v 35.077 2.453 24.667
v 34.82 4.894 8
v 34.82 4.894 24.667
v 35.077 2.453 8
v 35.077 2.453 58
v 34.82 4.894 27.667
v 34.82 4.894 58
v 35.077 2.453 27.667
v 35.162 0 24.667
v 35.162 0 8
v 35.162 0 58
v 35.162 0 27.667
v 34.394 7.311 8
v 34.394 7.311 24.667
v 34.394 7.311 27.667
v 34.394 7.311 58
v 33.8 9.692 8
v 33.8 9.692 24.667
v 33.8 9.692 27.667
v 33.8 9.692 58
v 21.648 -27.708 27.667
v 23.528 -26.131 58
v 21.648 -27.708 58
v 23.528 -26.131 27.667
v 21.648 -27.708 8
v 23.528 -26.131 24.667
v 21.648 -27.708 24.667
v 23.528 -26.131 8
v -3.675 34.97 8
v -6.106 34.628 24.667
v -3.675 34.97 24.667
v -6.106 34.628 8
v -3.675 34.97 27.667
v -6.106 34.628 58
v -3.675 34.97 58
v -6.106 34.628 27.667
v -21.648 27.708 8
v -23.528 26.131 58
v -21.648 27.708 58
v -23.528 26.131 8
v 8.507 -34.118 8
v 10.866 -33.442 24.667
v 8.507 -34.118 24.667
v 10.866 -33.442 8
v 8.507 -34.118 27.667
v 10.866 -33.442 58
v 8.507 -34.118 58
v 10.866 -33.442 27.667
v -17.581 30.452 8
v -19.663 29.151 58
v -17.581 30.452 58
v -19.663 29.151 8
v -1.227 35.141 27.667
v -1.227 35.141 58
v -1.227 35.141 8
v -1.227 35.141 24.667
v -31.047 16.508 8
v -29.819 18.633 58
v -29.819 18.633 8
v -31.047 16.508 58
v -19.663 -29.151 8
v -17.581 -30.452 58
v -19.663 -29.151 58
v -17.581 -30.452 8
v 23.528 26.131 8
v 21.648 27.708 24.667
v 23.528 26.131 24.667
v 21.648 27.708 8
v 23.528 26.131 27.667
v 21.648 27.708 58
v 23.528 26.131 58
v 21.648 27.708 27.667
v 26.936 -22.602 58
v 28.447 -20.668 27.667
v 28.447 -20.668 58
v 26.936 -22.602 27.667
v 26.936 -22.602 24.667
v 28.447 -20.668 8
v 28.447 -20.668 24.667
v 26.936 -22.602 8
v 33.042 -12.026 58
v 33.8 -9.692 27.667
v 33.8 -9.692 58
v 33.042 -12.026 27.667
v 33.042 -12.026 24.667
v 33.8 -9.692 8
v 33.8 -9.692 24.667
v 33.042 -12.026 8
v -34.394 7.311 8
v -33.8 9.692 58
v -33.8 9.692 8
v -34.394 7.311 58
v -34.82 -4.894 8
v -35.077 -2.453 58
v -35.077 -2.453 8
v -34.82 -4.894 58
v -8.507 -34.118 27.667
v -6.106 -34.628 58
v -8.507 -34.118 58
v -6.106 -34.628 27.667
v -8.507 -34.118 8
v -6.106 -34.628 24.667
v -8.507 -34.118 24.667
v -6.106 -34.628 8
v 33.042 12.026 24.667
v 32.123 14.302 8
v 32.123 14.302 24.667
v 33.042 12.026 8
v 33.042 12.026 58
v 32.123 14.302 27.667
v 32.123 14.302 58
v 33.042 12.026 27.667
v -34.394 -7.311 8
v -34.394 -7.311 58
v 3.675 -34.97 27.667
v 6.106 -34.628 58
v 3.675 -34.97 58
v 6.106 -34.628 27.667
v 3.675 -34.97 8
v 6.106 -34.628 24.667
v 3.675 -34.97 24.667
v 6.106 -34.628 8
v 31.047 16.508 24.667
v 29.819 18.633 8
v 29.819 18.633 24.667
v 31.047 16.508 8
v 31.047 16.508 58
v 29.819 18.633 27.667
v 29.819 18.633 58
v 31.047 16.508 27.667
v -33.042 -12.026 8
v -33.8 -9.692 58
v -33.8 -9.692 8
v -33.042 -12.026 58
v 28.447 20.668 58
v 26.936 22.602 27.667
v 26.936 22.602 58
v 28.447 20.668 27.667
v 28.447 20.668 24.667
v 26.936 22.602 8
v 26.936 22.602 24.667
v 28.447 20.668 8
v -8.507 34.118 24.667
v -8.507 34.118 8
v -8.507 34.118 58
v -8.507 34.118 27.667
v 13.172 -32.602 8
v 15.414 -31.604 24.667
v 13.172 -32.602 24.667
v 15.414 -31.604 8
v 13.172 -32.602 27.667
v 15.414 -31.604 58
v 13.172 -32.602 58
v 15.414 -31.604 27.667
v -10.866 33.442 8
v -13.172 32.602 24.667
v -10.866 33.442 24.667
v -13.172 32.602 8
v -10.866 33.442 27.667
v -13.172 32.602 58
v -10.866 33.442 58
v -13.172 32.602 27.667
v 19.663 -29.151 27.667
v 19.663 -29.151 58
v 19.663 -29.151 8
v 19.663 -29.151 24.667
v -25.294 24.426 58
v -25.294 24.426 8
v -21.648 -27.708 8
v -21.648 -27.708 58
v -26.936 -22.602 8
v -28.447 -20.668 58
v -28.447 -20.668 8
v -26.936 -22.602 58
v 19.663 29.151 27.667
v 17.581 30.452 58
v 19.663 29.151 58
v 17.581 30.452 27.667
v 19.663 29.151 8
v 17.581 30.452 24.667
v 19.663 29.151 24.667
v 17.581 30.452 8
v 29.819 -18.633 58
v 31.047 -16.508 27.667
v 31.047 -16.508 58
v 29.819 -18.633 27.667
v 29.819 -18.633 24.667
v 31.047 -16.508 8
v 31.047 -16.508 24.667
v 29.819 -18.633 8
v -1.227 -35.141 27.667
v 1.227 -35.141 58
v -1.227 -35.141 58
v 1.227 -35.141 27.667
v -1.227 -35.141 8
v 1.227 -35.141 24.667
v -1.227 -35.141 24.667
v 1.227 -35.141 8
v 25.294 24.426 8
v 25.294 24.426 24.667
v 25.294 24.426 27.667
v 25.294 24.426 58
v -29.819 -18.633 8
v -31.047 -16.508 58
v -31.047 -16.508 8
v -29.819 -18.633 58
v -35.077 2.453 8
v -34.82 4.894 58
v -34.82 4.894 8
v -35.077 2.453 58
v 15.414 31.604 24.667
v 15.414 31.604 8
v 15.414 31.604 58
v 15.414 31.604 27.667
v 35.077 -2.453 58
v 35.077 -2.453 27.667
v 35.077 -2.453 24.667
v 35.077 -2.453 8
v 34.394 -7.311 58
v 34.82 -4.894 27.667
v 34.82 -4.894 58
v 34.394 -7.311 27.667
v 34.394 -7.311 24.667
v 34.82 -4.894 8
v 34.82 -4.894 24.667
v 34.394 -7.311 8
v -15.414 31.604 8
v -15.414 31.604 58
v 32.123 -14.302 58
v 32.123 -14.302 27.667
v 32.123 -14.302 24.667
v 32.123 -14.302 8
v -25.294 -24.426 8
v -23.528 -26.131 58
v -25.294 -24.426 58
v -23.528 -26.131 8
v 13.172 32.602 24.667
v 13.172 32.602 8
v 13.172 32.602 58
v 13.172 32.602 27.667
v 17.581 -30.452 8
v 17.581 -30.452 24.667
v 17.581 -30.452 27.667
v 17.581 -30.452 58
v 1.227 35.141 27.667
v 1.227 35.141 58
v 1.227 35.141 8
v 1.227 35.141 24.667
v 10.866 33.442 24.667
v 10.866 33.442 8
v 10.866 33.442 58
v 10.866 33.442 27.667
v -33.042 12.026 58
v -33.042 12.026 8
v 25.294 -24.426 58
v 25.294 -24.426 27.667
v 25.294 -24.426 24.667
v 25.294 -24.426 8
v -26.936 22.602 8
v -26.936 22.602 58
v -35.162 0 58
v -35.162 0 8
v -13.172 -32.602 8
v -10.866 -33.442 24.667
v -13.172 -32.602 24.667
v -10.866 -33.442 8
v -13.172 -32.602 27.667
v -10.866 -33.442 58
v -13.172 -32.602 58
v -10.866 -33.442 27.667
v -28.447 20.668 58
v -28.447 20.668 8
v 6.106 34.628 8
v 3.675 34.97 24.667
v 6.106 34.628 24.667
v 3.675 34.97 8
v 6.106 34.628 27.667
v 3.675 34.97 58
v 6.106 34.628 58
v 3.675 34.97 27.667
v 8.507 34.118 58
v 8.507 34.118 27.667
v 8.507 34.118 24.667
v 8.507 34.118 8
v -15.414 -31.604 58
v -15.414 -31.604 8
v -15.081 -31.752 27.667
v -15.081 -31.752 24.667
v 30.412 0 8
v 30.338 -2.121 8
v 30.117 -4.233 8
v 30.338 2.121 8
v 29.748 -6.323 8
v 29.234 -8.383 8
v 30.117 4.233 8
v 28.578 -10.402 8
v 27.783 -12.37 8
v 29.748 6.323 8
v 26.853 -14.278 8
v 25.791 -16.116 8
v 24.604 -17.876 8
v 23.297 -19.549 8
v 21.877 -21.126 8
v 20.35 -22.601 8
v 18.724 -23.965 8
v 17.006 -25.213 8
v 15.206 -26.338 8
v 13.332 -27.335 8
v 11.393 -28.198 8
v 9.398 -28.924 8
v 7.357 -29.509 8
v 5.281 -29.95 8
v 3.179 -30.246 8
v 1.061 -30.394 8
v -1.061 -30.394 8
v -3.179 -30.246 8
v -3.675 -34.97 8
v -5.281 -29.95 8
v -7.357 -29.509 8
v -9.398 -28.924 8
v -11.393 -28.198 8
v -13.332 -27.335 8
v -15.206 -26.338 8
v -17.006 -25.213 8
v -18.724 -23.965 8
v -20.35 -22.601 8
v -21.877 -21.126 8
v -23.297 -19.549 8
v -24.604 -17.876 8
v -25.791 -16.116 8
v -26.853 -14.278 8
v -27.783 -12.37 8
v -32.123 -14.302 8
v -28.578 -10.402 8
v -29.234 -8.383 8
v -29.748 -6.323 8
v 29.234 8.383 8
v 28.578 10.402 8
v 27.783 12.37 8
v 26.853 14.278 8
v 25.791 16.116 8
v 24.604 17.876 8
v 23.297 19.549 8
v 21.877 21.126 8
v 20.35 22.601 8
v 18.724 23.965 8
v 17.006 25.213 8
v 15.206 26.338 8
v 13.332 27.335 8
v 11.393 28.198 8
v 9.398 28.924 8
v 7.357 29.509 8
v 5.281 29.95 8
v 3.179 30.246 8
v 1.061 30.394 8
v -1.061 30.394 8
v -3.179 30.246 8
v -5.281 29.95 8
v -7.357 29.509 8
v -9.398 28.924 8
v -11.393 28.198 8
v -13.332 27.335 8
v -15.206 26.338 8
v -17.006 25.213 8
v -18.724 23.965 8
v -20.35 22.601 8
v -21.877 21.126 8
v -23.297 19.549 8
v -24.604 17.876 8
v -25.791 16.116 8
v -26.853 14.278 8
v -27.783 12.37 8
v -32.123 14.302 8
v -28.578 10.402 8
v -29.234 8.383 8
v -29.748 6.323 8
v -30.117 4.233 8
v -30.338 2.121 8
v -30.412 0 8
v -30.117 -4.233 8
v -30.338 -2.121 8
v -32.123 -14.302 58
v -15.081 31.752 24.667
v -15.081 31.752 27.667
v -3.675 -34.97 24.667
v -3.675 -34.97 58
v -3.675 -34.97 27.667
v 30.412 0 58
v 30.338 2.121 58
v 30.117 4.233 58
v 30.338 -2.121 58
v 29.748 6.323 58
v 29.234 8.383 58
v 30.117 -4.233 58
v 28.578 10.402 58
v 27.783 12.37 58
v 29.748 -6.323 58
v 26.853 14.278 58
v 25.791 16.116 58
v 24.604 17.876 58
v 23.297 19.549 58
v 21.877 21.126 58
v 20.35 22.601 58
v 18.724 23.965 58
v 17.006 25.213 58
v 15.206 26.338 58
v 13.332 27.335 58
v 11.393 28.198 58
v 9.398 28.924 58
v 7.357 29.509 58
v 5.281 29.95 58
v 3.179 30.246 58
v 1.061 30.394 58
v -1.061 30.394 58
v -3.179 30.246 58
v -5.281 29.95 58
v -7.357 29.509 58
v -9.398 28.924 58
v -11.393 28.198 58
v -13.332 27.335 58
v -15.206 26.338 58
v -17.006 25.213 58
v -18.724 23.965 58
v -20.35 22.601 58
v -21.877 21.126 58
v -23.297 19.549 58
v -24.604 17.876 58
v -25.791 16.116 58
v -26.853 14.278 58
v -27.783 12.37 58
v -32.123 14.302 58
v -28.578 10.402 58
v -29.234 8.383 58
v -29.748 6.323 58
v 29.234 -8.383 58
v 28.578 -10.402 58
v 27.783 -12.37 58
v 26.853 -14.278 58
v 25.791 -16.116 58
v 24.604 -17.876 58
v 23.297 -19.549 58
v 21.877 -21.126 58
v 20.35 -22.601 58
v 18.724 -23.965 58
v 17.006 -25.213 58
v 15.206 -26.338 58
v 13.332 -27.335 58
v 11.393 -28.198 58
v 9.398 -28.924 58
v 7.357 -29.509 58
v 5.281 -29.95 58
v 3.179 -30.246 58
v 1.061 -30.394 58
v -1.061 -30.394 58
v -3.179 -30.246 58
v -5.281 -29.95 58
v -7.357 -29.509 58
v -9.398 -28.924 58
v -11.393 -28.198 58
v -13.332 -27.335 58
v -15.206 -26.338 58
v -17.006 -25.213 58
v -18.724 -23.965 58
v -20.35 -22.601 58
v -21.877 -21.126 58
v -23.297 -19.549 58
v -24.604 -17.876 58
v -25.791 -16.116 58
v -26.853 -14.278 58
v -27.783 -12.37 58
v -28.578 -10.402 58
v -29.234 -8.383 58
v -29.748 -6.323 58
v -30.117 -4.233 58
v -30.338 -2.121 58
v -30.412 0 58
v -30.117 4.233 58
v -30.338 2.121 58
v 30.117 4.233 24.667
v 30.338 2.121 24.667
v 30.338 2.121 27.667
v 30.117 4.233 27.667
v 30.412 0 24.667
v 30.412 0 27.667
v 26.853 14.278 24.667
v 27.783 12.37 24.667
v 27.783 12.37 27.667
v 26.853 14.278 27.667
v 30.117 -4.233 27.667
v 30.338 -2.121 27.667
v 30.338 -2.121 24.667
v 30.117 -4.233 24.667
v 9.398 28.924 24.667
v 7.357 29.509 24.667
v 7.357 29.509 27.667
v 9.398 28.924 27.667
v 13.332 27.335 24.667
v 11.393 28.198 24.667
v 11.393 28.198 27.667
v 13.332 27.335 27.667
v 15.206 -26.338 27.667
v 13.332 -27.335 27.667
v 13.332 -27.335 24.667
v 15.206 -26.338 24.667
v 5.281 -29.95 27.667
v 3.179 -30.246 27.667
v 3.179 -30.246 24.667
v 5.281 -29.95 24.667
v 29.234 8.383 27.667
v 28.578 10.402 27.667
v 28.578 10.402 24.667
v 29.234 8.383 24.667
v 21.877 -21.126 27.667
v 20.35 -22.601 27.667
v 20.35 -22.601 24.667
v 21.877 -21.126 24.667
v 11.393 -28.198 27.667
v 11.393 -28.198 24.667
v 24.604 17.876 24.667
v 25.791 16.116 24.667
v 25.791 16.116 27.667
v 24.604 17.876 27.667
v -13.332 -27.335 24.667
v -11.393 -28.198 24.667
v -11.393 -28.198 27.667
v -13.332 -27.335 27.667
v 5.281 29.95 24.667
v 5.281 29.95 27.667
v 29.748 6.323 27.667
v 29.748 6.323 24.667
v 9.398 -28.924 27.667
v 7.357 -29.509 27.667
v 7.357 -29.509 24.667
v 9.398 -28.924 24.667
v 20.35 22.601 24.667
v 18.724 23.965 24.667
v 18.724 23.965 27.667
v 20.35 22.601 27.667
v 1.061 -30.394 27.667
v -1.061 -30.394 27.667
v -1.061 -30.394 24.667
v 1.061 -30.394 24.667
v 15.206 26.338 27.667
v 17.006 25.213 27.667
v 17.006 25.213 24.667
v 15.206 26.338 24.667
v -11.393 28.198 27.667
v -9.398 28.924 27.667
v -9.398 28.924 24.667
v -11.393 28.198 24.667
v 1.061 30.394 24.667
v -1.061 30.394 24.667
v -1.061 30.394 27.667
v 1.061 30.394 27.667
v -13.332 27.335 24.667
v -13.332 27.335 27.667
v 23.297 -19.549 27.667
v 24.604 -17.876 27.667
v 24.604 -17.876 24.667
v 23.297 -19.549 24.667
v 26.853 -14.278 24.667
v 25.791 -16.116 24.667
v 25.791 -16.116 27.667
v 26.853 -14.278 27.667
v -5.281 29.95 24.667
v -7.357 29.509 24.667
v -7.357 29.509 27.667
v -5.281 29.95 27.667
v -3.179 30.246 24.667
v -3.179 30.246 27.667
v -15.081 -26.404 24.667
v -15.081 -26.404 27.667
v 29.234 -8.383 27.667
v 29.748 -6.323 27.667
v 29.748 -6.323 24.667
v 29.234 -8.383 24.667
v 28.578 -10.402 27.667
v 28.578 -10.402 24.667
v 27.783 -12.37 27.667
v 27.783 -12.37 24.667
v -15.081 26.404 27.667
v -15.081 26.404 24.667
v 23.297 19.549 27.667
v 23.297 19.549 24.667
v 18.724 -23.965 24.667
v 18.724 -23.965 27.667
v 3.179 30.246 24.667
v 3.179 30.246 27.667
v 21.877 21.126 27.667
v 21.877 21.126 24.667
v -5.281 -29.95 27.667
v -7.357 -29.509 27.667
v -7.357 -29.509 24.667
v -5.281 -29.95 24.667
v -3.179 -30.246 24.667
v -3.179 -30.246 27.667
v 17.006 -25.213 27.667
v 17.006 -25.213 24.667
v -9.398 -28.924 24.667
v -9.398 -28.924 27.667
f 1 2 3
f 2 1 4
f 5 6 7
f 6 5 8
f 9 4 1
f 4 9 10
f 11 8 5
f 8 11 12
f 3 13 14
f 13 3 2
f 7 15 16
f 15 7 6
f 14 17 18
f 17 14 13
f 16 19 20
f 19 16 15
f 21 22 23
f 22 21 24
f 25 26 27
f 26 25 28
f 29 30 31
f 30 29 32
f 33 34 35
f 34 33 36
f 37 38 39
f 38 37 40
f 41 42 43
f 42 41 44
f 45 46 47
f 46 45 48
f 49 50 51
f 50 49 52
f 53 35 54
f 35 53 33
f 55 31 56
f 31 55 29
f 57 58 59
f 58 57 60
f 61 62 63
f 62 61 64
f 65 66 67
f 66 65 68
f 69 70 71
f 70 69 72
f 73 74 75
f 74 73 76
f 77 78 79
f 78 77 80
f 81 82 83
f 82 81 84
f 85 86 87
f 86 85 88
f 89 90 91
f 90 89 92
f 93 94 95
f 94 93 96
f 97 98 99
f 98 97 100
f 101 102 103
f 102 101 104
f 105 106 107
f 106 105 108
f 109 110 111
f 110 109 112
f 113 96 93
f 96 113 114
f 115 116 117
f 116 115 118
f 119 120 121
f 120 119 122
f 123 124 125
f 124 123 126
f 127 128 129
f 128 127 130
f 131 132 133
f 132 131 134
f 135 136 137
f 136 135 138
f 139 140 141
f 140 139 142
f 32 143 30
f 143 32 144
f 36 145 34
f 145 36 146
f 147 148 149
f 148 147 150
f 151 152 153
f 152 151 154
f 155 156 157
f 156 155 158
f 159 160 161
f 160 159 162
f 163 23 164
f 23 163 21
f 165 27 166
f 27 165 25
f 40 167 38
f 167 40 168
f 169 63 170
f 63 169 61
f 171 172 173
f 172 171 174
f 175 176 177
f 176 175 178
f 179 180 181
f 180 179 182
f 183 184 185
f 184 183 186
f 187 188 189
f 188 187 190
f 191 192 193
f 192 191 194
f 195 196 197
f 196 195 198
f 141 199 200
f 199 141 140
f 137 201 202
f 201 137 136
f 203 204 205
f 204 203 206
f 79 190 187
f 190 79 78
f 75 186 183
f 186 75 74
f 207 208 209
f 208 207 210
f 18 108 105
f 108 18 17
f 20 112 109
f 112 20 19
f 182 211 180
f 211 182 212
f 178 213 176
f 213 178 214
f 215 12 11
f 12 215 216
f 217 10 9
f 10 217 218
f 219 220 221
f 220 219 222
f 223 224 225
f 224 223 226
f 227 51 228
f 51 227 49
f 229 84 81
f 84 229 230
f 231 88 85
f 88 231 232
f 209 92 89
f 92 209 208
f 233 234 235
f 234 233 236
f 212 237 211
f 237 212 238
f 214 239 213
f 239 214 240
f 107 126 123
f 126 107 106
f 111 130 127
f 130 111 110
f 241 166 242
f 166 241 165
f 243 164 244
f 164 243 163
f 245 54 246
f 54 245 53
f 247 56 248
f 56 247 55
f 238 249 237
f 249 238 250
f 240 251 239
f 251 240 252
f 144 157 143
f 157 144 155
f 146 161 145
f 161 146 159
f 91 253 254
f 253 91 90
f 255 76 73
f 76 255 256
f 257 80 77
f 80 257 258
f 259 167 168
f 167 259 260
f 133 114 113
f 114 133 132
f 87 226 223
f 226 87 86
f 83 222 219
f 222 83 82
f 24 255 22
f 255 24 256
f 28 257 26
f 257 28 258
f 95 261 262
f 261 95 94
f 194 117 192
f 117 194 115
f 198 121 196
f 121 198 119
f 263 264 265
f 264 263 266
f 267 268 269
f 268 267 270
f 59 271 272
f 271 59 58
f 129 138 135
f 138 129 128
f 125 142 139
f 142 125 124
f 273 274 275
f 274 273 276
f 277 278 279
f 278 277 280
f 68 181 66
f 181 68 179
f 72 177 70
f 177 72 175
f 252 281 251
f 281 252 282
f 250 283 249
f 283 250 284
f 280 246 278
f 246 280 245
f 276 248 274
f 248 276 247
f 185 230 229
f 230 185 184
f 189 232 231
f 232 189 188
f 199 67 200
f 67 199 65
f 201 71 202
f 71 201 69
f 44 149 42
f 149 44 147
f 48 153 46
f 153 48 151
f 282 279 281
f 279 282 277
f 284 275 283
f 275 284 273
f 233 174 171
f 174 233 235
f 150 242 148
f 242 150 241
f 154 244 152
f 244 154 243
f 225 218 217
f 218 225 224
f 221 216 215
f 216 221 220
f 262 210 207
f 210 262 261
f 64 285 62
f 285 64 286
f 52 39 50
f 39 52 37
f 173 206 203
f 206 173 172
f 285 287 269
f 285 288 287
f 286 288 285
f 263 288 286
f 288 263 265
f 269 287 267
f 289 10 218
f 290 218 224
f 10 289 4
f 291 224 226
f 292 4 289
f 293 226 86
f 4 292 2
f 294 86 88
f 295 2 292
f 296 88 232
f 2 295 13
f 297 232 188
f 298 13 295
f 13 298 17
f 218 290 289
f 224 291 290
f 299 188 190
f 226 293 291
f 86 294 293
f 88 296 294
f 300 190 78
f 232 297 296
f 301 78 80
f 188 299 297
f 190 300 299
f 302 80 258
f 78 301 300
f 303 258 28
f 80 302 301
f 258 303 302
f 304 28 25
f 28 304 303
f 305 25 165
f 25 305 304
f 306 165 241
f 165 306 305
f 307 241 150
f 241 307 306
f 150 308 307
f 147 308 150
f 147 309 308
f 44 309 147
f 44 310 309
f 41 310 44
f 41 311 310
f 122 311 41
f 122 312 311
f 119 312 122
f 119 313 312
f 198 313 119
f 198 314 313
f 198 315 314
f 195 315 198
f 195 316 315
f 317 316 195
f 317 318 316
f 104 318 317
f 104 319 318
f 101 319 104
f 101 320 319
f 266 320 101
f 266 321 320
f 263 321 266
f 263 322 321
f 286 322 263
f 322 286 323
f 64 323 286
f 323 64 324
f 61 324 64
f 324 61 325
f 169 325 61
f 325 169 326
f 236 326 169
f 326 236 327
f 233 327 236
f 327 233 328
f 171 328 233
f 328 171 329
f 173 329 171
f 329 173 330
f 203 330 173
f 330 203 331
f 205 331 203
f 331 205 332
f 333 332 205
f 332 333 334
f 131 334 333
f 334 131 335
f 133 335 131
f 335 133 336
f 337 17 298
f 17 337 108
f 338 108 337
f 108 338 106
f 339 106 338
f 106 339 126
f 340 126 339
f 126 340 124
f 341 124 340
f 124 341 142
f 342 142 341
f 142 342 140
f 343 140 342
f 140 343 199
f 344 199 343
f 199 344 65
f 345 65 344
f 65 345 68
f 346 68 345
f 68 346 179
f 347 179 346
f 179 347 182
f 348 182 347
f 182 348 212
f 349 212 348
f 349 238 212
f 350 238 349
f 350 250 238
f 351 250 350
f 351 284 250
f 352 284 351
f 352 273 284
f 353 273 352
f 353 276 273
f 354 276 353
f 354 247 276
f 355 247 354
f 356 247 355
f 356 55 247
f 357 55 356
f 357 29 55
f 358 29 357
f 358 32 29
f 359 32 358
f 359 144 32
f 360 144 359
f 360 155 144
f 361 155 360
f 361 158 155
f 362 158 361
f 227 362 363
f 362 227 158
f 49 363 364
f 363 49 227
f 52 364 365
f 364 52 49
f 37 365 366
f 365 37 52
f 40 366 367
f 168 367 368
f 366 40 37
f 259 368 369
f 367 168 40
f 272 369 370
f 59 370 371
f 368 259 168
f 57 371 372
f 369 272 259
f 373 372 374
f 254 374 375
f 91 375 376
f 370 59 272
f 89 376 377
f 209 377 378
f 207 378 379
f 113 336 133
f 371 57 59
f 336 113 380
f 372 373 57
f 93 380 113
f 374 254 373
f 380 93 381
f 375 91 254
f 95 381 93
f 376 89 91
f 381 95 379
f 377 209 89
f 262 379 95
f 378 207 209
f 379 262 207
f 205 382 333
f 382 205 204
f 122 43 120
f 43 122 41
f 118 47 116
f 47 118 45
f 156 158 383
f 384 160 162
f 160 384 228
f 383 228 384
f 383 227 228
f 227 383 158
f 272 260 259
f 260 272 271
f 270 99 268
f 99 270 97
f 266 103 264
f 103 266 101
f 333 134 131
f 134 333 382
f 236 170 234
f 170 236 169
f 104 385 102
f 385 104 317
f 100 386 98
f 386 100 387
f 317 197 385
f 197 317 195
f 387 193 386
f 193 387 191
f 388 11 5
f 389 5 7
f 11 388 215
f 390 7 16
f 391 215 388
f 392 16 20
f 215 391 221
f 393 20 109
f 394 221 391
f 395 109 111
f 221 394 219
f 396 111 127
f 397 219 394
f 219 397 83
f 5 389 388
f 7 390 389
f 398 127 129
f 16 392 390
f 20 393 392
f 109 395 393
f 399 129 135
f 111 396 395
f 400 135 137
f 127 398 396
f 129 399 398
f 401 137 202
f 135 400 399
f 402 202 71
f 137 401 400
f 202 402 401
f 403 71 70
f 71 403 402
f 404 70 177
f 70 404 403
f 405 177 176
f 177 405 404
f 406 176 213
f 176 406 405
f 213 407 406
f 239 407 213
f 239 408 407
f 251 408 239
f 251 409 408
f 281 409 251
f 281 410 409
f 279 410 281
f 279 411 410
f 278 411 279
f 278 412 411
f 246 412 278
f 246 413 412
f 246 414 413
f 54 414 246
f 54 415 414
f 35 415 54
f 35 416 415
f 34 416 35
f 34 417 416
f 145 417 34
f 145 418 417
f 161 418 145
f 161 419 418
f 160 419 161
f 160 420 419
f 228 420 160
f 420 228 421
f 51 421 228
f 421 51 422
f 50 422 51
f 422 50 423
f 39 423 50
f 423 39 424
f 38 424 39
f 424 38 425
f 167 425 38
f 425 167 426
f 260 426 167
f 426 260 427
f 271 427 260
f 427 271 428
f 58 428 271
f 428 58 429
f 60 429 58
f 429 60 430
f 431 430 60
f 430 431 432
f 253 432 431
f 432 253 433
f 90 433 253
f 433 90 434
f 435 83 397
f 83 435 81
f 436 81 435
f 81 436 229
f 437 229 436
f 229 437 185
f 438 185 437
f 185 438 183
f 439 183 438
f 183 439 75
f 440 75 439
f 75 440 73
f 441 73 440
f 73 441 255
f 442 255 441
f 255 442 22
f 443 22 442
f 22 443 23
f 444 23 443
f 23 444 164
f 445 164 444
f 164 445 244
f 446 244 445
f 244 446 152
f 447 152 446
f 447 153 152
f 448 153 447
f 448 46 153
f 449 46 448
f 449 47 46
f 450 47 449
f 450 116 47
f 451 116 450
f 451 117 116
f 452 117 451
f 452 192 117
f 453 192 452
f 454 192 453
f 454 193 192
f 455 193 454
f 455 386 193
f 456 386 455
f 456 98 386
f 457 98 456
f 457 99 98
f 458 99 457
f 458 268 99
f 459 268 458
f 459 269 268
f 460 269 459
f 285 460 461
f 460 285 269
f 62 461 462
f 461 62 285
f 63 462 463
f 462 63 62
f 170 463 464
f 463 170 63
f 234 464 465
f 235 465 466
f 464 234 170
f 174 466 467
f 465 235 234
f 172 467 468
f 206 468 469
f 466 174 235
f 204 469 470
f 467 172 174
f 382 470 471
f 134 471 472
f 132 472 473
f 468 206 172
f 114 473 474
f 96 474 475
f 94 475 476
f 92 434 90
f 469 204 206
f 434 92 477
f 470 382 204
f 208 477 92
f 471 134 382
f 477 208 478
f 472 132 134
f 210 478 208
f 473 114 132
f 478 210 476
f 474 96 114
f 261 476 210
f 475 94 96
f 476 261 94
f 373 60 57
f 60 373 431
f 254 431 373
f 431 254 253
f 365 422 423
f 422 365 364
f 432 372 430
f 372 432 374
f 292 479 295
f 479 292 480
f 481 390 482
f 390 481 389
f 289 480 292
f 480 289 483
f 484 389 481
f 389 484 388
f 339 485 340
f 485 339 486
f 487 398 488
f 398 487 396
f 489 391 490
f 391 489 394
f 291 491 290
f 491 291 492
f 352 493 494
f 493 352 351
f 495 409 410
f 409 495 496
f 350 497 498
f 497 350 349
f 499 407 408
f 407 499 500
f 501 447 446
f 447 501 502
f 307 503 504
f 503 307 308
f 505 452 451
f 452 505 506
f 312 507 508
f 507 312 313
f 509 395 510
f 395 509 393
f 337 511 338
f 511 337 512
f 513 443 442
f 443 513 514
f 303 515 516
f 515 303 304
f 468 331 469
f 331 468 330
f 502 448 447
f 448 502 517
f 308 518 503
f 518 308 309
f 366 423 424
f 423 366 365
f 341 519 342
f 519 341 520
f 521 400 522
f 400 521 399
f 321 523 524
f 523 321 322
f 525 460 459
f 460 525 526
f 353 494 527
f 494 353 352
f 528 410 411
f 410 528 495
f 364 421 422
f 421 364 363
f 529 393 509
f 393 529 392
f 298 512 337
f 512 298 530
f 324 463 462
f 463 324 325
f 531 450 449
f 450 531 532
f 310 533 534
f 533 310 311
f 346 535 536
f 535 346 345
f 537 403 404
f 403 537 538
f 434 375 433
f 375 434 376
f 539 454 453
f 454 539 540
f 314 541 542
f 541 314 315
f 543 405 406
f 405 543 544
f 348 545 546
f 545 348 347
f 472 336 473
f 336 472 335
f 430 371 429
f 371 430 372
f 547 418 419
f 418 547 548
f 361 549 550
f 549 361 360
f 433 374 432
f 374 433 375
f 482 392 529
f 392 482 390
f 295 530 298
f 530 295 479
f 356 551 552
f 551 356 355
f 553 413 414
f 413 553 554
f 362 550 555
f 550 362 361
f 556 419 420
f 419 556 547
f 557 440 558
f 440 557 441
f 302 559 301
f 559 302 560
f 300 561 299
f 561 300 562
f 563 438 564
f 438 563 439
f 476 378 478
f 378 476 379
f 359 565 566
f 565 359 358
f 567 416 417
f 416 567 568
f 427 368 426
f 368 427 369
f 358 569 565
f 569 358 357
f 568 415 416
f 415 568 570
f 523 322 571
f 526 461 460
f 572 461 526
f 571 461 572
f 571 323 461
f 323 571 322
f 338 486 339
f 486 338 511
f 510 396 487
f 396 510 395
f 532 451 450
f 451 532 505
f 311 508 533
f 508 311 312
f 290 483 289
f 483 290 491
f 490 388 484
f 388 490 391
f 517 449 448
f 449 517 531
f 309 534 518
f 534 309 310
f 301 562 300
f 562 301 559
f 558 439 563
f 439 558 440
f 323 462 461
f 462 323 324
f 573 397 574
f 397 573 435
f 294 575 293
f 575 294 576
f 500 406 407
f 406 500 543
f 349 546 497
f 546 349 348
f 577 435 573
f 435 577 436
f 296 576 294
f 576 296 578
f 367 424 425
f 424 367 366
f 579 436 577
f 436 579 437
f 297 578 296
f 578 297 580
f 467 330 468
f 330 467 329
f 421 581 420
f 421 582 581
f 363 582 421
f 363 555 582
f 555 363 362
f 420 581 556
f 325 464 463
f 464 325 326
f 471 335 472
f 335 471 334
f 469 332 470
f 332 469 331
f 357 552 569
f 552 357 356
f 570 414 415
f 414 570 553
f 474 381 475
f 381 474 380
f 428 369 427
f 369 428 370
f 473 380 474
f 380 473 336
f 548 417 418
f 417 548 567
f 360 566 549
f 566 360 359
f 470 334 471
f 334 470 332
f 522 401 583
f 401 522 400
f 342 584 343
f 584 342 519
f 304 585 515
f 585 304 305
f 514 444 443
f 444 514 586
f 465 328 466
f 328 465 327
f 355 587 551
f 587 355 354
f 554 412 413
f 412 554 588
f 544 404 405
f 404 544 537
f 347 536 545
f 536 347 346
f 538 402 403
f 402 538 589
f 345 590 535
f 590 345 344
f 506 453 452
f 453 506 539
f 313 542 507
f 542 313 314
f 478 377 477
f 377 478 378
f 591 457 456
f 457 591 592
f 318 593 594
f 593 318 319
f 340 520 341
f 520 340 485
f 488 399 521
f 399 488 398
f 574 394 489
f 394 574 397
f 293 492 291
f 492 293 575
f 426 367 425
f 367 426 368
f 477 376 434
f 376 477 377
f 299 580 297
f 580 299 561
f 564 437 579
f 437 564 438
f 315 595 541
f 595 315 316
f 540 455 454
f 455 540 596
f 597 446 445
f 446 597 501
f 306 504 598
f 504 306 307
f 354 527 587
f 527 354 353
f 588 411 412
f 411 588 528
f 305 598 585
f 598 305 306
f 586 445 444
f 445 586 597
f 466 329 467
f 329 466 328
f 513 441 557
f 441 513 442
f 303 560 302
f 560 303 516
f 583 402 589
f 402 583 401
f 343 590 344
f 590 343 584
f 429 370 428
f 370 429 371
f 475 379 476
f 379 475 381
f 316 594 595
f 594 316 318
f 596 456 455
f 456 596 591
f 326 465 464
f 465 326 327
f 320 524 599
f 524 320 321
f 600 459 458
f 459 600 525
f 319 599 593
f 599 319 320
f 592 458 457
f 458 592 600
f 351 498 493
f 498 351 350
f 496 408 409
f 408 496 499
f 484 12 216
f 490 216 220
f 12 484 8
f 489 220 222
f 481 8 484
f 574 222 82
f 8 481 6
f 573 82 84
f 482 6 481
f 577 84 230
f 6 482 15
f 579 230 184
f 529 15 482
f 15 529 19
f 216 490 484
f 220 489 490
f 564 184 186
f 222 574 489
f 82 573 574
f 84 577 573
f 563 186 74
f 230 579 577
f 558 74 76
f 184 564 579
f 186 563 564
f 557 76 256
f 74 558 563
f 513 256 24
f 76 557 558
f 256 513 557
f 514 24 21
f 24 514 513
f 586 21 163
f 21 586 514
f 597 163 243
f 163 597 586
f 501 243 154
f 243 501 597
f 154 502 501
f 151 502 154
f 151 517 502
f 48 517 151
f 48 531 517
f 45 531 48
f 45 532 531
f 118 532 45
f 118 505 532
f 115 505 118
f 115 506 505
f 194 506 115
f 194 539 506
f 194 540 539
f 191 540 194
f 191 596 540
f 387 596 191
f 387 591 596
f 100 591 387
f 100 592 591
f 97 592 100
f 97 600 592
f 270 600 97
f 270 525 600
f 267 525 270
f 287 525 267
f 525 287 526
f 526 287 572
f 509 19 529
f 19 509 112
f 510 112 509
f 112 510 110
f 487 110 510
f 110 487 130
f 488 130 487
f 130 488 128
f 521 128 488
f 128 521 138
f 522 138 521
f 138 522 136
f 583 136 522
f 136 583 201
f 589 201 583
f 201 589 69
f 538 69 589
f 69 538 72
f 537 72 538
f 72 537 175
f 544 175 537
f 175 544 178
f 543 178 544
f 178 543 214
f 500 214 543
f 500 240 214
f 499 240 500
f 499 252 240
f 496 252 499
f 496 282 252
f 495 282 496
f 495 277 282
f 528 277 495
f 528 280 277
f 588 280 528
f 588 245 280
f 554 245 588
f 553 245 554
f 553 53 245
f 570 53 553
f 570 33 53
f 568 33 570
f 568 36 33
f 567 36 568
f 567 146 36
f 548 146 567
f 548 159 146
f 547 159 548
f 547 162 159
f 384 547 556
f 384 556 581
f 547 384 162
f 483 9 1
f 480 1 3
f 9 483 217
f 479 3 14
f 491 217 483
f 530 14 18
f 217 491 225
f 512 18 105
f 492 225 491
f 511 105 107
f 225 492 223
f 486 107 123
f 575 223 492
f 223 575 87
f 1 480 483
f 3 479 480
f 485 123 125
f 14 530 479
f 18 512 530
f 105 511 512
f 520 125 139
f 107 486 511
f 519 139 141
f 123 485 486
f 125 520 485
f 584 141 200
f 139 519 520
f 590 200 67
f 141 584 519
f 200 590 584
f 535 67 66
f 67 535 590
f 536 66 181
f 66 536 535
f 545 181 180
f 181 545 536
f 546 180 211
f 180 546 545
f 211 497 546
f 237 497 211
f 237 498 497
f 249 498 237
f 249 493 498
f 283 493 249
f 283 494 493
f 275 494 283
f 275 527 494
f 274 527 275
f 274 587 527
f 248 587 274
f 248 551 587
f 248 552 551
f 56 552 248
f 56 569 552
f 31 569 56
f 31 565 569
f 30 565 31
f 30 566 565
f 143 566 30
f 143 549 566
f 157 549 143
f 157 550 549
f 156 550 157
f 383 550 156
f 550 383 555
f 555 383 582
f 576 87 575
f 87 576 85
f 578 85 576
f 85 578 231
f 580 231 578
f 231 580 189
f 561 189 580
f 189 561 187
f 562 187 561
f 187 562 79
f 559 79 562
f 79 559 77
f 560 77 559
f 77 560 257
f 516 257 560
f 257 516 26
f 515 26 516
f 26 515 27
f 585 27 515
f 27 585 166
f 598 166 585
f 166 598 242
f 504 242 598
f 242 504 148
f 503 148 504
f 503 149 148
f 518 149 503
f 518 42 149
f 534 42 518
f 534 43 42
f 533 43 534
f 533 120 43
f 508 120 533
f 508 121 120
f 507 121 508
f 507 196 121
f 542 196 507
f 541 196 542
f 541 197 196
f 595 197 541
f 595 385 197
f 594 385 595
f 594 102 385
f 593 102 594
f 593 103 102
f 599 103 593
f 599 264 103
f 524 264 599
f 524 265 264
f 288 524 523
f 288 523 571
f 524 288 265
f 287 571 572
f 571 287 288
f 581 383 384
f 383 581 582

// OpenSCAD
$fn=90;

DIA= (2 + 3/8) * 25.4;
HEIGHT=50;
THICK=5;

translate([0, 0, 8])

difference()
{
    color("GREEN", .5)
    cylinder(d = DIA + THICK*2, h = HEIGHT);
    cylinder(d = DIA +.5, h = HEIGHT);
    translate([-DIA/4, -DIA*3/4, HEIGHT/3])
    #cube([DIA*2,DIA*2,3]);
}
